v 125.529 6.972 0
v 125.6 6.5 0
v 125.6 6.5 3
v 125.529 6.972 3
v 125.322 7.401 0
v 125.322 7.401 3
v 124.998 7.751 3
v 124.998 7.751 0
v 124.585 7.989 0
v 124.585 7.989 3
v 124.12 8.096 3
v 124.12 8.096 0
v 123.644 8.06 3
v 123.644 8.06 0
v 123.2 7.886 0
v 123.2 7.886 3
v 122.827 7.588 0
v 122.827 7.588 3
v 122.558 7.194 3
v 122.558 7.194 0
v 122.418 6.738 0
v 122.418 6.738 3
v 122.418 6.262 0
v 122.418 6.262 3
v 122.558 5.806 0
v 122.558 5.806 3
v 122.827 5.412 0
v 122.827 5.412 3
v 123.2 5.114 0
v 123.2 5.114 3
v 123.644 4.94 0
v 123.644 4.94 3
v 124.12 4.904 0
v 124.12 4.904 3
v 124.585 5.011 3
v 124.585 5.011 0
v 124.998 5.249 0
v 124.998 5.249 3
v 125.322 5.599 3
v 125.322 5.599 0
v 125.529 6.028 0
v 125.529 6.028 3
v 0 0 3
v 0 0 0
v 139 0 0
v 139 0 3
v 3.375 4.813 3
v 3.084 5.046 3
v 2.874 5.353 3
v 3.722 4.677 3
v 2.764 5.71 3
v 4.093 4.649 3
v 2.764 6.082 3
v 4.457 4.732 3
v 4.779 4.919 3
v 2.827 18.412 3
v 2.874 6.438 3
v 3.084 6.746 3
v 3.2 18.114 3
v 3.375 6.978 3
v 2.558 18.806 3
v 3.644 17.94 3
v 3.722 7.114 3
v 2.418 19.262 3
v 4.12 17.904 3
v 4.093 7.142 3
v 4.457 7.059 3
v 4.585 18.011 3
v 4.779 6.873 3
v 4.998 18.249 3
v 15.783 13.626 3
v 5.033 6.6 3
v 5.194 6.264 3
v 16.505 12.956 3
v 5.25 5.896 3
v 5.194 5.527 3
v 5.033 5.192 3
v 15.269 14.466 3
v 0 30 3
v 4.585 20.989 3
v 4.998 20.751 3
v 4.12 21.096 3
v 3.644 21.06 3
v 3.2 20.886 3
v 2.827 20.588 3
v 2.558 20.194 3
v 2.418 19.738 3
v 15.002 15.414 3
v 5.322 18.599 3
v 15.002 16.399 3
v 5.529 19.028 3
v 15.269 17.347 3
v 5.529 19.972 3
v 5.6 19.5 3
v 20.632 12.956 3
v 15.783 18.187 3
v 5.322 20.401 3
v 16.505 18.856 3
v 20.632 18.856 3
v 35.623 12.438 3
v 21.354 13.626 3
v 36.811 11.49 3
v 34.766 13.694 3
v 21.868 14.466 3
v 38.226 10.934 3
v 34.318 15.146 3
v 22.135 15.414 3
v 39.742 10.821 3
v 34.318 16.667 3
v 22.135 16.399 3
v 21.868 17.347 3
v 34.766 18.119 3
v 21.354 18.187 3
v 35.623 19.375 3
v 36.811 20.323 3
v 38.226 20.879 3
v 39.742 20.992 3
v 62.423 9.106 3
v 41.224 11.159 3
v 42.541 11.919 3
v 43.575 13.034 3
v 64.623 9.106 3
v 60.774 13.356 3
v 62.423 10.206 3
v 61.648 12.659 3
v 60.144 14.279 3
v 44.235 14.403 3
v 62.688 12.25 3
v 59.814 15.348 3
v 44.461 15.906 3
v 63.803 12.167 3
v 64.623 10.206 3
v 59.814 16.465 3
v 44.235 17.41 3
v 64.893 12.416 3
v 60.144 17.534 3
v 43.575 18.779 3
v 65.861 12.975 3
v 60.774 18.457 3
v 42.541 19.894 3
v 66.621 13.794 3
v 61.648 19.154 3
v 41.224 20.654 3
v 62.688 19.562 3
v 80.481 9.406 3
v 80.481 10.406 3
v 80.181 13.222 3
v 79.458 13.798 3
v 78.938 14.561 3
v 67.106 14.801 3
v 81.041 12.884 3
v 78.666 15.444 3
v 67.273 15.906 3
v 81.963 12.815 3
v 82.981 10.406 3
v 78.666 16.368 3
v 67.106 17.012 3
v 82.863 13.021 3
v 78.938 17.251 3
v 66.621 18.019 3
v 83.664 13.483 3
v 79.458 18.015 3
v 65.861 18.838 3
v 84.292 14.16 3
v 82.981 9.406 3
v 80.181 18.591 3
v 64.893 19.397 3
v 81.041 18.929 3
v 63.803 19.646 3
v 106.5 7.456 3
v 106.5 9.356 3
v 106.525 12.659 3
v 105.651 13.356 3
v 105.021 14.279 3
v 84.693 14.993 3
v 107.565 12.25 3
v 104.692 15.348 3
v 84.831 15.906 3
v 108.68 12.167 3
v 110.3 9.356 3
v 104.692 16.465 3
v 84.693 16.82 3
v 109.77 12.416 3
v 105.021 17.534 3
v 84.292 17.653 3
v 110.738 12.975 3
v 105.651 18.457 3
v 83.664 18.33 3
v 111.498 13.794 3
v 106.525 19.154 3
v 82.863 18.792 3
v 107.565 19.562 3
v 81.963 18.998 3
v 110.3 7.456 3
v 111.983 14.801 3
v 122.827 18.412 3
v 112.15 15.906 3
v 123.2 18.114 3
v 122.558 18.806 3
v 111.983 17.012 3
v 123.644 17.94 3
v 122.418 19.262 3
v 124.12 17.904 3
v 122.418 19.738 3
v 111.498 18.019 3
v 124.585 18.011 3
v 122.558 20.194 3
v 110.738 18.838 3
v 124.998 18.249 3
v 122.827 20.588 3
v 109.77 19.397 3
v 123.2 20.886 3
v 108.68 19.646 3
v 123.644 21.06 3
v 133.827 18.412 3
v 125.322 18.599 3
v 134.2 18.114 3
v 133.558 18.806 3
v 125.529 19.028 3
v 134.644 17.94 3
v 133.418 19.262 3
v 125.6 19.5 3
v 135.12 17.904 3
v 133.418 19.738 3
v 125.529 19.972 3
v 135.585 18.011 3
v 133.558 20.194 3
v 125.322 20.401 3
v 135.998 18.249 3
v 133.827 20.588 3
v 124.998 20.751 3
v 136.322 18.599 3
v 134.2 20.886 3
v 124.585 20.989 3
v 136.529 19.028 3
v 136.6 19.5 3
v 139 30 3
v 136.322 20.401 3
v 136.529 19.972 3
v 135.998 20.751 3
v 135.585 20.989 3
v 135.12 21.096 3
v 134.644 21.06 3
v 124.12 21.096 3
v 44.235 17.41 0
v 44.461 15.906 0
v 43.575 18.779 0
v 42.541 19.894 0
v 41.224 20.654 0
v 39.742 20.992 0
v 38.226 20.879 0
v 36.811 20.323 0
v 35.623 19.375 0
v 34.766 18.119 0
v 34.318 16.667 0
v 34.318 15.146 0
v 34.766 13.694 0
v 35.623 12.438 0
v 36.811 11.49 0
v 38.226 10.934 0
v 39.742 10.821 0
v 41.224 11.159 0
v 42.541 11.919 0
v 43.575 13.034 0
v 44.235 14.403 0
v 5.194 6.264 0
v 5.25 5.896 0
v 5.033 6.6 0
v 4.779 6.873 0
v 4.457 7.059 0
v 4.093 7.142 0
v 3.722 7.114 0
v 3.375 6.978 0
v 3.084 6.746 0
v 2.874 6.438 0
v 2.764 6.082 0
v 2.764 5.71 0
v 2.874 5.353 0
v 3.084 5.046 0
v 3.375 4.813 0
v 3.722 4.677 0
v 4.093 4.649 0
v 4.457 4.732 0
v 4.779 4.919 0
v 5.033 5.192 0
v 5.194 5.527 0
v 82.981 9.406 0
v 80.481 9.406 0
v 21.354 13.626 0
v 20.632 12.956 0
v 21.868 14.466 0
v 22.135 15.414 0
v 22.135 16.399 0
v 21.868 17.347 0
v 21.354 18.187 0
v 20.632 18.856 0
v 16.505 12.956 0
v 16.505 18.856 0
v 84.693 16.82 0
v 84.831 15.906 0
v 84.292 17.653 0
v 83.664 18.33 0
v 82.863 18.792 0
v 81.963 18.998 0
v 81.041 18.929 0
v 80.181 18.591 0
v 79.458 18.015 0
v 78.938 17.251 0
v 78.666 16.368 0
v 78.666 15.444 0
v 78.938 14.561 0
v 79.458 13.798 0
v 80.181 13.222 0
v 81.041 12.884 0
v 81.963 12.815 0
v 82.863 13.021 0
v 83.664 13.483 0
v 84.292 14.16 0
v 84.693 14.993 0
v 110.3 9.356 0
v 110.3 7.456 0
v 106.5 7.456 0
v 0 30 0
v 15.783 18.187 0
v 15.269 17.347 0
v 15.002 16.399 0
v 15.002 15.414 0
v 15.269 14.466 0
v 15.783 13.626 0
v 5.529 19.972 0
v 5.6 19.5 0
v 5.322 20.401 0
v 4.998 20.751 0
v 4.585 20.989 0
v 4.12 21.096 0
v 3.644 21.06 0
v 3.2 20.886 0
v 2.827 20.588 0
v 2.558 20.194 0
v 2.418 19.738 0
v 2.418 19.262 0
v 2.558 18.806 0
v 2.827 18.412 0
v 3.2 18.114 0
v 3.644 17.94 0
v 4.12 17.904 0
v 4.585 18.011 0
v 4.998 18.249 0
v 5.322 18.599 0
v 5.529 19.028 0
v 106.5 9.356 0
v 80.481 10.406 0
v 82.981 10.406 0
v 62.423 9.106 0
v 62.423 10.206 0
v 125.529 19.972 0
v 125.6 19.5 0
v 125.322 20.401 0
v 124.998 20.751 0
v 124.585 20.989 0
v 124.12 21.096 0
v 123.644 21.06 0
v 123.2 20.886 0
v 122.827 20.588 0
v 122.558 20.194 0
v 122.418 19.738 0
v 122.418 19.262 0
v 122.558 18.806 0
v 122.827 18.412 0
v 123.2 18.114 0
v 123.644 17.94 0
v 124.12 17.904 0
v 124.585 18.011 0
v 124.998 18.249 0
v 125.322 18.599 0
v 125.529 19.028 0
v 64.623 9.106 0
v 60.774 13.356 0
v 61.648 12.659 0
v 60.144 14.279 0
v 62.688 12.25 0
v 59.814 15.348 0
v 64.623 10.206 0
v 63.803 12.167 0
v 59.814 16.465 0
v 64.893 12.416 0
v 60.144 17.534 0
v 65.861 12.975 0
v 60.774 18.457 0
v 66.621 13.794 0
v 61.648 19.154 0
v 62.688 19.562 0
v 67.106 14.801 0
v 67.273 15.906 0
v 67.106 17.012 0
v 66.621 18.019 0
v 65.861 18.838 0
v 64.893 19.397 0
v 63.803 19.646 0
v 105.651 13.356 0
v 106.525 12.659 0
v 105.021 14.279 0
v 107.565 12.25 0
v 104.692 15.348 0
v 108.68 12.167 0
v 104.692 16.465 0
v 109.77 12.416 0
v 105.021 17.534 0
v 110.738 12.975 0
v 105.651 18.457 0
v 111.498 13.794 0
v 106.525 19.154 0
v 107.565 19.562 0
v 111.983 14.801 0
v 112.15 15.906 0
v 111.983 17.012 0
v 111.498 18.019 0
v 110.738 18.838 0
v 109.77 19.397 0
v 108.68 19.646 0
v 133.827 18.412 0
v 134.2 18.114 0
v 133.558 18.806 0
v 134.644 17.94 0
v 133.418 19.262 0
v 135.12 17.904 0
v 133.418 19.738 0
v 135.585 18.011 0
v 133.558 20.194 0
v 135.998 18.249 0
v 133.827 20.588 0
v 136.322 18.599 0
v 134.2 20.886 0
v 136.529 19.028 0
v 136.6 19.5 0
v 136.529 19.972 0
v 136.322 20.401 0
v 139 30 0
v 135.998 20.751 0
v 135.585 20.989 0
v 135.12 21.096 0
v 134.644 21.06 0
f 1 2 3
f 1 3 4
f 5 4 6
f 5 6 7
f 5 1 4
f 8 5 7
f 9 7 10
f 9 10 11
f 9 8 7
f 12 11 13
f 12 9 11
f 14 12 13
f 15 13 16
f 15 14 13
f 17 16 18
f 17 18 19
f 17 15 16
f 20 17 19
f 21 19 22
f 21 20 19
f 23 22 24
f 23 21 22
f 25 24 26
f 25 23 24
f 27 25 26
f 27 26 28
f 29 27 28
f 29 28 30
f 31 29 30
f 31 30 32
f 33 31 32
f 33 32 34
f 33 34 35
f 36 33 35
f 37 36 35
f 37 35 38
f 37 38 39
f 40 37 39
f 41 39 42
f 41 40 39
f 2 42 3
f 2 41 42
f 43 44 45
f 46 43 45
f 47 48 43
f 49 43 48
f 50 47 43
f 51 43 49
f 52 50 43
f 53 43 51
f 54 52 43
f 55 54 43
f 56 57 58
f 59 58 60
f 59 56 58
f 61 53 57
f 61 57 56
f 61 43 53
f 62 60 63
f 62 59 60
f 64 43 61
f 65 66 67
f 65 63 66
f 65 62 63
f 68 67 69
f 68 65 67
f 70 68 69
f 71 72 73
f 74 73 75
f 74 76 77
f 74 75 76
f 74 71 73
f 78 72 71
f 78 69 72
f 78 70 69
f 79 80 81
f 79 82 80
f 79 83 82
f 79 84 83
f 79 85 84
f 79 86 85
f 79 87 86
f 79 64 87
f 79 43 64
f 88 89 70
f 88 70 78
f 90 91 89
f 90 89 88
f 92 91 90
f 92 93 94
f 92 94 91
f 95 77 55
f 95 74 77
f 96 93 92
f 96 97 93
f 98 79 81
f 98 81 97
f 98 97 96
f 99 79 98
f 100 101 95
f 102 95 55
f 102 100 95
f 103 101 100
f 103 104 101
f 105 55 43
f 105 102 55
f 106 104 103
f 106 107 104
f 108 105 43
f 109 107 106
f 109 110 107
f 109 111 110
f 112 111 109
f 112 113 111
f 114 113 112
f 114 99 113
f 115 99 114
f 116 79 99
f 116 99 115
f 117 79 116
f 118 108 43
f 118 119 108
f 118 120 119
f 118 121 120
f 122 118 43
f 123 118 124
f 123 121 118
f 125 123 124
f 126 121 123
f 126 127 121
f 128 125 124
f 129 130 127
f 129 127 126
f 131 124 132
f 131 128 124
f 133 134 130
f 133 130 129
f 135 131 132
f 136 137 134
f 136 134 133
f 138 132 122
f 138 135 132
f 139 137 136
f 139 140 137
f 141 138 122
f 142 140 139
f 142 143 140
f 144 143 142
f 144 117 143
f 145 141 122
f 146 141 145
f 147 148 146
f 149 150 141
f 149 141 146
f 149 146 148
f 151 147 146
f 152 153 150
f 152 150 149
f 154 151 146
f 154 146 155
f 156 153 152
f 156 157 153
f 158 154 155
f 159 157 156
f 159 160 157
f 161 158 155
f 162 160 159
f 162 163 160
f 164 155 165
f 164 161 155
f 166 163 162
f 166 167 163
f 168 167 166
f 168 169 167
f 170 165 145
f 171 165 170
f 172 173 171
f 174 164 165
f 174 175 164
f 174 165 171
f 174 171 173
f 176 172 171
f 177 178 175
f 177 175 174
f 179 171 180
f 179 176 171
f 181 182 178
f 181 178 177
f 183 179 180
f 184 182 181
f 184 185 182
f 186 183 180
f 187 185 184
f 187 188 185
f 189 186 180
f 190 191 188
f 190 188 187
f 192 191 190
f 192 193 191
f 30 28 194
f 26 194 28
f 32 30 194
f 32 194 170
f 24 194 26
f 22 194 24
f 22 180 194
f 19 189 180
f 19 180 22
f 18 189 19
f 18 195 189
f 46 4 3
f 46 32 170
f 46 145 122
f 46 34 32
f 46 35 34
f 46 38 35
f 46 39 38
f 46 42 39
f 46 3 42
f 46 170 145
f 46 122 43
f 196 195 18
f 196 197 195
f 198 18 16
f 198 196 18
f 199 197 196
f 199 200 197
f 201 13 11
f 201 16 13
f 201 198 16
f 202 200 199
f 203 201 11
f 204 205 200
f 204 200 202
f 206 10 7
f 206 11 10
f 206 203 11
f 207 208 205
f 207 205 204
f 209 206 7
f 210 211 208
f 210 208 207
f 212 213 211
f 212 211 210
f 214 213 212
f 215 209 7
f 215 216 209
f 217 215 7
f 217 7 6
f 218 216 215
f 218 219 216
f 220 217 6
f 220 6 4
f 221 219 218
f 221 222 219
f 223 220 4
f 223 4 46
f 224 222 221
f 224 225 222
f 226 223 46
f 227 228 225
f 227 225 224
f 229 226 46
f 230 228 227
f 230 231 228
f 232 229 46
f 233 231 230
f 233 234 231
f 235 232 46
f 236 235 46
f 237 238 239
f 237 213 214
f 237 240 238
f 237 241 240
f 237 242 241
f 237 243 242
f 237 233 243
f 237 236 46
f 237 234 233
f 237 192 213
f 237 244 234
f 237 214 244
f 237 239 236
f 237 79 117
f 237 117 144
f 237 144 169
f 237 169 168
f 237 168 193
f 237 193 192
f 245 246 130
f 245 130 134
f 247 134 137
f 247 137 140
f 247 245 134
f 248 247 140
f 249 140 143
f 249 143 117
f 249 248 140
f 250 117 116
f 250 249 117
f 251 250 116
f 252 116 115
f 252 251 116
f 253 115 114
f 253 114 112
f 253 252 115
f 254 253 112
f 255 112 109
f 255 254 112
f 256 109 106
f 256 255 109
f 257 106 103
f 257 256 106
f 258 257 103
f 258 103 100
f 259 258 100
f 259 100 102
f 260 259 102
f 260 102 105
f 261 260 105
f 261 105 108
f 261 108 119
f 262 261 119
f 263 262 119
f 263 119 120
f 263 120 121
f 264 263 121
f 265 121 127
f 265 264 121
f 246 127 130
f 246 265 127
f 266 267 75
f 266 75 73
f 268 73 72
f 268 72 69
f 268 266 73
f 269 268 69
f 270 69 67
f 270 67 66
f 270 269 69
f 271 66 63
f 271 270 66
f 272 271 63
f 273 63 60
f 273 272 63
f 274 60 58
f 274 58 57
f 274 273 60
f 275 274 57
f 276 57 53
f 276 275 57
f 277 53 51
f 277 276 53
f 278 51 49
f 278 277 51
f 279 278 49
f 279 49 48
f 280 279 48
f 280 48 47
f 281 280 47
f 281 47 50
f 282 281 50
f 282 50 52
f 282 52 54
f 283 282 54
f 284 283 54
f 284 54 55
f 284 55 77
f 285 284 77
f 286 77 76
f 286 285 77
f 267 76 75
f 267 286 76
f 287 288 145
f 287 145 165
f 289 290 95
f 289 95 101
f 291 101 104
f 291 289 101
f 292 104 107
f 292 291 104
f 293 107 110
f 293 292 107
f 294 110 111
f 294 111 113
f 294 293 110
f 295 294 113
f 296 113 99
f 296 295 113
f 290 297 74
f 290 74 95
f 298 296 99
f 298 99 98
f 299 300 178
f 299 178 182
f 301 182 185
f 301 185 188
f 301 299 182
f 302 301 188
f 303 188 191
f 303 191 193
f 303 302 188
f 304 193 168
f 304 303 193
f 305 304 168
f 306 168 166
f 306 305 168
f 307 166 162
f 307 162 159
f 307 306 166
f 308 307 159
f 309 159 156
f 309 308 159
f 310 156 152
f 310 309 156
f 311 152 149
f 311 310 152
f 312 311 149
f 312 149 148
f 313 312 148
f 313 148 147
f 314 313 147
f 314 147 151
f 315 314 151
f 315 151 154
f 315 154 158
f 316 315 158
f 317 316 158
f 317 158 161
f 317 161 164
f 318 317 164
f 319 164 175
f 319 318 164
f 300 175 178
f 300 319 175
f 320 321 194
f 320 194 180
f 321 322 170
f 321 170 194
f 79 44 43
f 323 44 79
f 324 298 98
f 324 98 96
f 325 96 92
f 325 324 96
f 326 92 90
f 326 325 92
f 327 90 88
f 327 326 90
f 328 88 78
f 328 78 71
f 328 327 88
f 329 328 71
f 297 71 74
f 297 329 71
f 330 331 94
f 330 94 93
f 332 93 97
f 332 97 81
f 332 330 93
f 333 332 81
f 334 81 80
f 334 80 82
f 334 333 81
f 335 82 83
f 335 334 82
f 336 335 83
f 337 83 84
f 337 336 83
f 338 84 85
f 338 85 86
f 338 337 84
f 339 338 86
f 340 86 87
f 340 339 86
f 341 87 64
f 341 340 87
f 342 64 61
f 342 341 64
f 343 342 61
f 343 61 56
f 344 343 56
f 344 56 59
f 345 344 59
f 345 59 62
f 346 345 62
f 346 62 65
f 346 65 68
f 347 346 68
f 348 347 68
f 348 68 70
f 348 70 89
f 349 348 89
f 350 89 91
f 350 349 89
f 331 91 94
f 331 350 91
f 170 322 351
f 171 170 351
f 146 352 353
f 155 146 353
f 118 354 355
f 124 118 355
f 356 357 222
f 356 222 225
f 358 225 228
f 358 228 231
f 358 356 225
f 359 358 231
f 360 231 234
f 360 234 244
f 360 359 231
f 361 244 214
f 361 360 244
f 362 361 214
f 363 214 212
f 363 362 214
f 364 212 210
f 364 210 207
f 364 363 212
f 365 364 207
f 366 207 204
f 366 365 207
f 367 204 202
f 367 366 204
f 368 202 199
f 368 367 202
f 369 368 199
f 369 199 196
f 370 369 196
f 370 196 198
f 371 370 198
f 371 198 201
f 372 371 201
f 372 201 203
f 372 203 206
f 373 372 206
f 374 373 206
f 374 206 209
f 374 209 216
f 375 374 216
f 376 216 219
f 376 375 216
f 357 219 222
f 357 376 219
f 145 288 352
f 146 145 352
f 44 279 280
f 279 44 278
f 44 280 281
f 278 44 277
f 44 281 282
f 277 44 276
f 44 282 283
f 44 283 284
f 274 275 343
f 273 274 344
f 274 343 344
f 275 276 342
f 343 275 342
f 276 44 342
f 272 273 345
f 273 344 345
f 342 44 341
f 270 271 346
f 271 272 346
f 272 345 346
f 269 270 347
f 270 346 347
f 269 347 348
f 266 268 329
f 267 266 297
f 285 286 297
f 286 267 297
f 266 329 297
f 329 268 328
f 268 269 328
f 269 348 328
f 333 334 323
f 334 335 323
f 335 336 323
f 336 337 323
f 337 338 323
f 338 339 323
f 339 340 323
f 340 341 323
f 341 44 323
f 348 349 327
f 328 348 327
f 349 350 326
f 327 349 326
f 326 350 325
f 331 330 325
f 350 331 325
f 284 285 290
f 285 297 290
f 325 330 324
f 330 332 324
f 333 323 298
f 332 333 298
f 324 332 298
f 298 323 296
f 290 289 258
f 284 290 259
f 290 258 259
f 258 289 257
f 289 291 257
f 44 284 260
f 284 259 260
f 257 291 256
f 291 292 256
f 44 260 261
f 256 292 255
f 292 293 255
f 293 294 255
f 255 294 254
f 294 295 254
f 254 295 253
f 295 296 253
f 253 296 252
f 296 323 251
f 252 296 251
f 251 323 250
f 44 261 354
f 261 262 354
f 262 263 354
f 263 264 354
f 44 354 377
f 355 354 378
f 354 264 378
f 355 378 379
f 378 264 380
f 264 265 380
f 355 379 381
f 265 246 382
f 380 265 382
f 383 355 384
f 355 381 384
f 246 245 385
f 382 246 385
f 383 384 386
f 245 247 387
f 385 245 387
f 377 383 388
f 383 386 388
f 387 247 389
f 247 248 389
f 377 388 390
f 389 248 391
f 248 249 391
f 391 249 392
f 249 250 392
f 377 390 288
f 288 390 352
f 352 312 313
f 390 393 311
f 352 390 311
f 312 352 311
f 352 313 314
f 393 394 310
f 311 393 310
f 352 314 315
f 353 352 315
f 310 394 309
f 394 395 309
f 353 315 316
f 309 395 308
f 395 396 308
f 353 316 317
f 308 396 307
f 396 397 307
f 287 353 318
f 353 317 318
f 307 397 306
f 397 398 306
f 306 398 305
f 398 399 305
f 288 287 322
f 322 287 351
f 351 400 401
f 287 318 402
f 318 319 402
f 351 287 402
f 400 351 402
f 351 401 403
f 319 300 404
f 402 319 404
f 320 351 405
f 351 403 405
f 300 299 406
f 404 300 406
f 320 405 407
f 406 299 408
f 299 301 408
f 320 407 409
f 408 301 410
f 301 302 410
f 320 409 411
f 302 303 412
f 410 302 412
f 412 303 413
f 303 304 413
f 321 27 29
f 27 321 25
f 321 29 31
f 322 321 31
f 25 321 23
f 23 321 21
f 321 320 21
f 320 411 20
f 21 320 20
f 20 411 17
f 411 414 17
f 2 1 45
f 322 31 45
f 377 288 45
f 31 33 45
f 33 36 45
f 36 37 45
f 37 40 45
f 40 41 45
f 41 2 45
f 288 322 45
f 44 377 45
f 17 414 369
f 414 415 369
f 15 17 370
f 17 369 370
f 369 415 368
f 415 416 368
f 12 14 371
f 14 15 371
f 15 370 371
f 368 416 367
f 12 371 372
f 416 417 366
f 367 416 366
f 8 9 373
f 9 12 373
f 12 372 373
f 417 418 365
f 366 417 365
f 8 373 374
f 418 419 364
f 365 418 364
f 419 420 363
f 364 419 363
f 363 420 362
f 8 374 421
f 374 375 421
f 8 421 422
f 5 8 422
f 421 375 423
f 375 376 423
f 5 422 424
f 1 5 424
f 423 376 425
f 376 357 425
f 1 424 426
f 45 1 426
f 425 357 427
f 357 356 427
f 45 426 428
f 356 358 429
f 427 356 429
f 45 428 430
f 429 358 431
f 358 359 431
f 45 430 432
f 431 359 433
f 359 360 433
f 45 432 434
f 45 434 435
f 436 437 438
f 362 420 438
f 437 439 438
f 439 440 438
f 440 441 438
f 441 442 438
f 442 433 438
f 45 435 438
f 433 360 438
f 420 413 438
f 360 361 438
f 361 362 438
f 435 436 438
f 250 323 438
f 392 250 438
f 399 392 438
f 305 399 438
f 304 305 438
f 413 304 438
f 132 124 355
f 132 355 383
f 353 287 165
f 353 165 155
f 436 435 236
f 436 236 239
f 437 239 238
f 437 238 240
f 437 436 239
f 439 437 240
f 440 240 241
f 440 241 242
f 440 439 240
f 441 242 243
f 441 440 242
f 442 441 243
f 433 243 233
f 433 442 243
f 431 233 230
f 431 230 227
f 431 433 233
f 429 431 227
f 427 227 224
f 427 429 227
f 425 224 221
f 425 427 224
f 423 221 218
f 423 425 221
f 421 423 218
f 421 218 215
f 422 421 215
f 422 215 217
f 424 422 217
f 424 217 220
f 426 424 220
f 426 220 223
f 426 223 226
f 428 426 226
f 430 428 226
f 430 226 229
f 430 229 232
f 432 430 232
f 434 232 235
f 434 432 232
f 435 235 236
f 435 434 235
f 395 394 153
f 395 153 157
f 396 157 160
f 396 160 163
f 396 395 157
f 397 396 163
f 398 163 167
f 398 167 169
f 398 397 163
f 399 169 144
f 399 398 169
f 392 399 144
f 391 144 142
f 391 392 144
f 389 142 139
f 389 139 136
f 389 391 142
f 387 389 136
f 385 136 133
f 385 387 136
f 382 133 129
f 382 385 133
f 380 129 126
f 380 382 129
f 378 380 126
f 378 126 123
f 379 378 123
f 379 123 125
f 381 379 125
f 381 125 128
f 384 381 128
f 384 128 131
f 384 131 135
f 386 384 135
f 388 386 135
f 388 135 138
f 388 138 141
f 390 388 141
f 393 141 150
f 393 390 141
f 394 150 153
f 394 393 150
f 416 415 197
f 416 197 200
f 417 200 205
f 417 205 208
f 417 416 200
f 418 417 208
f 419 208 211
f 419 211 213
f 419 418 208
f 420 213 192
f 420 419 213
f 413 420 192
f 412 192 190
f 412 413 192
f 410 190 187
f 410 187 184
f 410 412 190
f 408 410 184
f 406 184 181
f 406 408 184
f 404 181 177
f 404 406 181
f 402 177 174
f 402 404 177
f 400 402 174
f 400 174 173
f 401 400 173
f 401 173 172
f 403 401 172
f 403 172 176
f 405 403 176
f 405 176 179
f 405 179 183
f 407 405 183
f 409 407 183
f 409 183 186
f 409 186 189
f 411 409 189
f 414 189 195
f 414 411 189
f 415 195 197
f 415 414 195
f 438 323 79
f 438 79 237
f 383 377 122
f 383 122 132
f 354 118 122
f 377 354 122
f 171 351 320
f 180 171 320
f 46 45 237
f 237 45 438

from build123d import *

# Parameters (mm, degrees)
SKETCH1_W           = 139
SKETCH1_H           = 30
SKETCH1_R           = 1.6
SKETCH1_R_2         = 5.1
SKETCH1_R_3         = 3.75
SKETCH1_R_4         = 3.1
SKETCH1_R_5         = 1.25
SKETCH1_W_2         = 2.2
SKETCH1_H_2         = 1.1
SKETCH1_W_3         = 2.5
SKETCH1_H_3         = 1
SKETCH1_W_4         = 3.8
SKETCH1_H_4         = 1.9
BOSS_EXTRUDE1_DEPTH = 3


with BuildPart() as part:
    # Sketch1 → Boss-Extrude1 (new body)
    with BuildSketch(Plane.XY):
        with Locations((69.5, 15)):
            Rectangle(SKETCH1_W, SKETCH1_H)
        with Locations((4, 19.5)):
            Circle(SKETCH1_R, mode=Mode.SUBTRACT)
        with Locations((135, 19.5)):
            Circle(SKETCH1_R, mode=Mode.SUBTRACT)
        with Locations((124, 19.5)):
            Circle(SKETCH1_R, mode=Mode.SUBTRACT)
        with Locations((39.361239448, 15.906458033)):
            Circle(SKETCH1_R_2, mode=Mode.SUBTRACT)
        with Locations((63.522500572, 15.906458033)):
            Circle(SKETCH1_R_3, mode=Mode.SUBTRACT)
        with Locations((81.730883445, 15.906458033)):
            Circle(SKETCH1_R_4, mode=Mode.SUBTRACT)
        with Locations((108.399727047, 15.906458033)):
            Circle(SKETCH1_R_3, mode=Mode.SUBTRACT)
        with Locations((4, 5.895808563)):
            Circle(SKETCH1_R_5, mode=Mode.SUBTRACT)
        with Locations((124, 6.5)):
            Circle(SKETCH1_R, mode=Mode.SUBTRACT)
        with Locations((63.522500572, 9.656458033)):
            Rectangle(SKETCH1_W_2, SKETCH1_H_2, mode=Mode.SUBTRACT)
        with Locations((81.730883445, 9.906458033)):
            Rectangle(SKETCH1_W_3, SKETCH1_H_3, mode=Mode.SUBTRACT)
        with Locations((108.399727047, 8.406458033)):
            Rectangle(SKETCH1_W_4, SKETCH1_H_4, mode=Mode.SUBTRACT)
        with BuildLine():
            Line((16.505280772, 12.956458033), (20.632022828, 12.956458033))
            ThreePointArc((20.632022828, 12.956458033), (22.1686518, 15.906458033), (20.632022828, 18.856458033))
            Line((20.632022828, 18.856458033), (16.505280772, 18.856458033))
            ThreePointArc((16.505280772, 18.856458033), (14.9686518, 15.906458033), (16.505280772, 12.956458033))
        make_face(mode=Mode.SUBTRACT)
    extrude(amount=BOSS_EXTRUDE1_DEPTH)


solid = part.part
